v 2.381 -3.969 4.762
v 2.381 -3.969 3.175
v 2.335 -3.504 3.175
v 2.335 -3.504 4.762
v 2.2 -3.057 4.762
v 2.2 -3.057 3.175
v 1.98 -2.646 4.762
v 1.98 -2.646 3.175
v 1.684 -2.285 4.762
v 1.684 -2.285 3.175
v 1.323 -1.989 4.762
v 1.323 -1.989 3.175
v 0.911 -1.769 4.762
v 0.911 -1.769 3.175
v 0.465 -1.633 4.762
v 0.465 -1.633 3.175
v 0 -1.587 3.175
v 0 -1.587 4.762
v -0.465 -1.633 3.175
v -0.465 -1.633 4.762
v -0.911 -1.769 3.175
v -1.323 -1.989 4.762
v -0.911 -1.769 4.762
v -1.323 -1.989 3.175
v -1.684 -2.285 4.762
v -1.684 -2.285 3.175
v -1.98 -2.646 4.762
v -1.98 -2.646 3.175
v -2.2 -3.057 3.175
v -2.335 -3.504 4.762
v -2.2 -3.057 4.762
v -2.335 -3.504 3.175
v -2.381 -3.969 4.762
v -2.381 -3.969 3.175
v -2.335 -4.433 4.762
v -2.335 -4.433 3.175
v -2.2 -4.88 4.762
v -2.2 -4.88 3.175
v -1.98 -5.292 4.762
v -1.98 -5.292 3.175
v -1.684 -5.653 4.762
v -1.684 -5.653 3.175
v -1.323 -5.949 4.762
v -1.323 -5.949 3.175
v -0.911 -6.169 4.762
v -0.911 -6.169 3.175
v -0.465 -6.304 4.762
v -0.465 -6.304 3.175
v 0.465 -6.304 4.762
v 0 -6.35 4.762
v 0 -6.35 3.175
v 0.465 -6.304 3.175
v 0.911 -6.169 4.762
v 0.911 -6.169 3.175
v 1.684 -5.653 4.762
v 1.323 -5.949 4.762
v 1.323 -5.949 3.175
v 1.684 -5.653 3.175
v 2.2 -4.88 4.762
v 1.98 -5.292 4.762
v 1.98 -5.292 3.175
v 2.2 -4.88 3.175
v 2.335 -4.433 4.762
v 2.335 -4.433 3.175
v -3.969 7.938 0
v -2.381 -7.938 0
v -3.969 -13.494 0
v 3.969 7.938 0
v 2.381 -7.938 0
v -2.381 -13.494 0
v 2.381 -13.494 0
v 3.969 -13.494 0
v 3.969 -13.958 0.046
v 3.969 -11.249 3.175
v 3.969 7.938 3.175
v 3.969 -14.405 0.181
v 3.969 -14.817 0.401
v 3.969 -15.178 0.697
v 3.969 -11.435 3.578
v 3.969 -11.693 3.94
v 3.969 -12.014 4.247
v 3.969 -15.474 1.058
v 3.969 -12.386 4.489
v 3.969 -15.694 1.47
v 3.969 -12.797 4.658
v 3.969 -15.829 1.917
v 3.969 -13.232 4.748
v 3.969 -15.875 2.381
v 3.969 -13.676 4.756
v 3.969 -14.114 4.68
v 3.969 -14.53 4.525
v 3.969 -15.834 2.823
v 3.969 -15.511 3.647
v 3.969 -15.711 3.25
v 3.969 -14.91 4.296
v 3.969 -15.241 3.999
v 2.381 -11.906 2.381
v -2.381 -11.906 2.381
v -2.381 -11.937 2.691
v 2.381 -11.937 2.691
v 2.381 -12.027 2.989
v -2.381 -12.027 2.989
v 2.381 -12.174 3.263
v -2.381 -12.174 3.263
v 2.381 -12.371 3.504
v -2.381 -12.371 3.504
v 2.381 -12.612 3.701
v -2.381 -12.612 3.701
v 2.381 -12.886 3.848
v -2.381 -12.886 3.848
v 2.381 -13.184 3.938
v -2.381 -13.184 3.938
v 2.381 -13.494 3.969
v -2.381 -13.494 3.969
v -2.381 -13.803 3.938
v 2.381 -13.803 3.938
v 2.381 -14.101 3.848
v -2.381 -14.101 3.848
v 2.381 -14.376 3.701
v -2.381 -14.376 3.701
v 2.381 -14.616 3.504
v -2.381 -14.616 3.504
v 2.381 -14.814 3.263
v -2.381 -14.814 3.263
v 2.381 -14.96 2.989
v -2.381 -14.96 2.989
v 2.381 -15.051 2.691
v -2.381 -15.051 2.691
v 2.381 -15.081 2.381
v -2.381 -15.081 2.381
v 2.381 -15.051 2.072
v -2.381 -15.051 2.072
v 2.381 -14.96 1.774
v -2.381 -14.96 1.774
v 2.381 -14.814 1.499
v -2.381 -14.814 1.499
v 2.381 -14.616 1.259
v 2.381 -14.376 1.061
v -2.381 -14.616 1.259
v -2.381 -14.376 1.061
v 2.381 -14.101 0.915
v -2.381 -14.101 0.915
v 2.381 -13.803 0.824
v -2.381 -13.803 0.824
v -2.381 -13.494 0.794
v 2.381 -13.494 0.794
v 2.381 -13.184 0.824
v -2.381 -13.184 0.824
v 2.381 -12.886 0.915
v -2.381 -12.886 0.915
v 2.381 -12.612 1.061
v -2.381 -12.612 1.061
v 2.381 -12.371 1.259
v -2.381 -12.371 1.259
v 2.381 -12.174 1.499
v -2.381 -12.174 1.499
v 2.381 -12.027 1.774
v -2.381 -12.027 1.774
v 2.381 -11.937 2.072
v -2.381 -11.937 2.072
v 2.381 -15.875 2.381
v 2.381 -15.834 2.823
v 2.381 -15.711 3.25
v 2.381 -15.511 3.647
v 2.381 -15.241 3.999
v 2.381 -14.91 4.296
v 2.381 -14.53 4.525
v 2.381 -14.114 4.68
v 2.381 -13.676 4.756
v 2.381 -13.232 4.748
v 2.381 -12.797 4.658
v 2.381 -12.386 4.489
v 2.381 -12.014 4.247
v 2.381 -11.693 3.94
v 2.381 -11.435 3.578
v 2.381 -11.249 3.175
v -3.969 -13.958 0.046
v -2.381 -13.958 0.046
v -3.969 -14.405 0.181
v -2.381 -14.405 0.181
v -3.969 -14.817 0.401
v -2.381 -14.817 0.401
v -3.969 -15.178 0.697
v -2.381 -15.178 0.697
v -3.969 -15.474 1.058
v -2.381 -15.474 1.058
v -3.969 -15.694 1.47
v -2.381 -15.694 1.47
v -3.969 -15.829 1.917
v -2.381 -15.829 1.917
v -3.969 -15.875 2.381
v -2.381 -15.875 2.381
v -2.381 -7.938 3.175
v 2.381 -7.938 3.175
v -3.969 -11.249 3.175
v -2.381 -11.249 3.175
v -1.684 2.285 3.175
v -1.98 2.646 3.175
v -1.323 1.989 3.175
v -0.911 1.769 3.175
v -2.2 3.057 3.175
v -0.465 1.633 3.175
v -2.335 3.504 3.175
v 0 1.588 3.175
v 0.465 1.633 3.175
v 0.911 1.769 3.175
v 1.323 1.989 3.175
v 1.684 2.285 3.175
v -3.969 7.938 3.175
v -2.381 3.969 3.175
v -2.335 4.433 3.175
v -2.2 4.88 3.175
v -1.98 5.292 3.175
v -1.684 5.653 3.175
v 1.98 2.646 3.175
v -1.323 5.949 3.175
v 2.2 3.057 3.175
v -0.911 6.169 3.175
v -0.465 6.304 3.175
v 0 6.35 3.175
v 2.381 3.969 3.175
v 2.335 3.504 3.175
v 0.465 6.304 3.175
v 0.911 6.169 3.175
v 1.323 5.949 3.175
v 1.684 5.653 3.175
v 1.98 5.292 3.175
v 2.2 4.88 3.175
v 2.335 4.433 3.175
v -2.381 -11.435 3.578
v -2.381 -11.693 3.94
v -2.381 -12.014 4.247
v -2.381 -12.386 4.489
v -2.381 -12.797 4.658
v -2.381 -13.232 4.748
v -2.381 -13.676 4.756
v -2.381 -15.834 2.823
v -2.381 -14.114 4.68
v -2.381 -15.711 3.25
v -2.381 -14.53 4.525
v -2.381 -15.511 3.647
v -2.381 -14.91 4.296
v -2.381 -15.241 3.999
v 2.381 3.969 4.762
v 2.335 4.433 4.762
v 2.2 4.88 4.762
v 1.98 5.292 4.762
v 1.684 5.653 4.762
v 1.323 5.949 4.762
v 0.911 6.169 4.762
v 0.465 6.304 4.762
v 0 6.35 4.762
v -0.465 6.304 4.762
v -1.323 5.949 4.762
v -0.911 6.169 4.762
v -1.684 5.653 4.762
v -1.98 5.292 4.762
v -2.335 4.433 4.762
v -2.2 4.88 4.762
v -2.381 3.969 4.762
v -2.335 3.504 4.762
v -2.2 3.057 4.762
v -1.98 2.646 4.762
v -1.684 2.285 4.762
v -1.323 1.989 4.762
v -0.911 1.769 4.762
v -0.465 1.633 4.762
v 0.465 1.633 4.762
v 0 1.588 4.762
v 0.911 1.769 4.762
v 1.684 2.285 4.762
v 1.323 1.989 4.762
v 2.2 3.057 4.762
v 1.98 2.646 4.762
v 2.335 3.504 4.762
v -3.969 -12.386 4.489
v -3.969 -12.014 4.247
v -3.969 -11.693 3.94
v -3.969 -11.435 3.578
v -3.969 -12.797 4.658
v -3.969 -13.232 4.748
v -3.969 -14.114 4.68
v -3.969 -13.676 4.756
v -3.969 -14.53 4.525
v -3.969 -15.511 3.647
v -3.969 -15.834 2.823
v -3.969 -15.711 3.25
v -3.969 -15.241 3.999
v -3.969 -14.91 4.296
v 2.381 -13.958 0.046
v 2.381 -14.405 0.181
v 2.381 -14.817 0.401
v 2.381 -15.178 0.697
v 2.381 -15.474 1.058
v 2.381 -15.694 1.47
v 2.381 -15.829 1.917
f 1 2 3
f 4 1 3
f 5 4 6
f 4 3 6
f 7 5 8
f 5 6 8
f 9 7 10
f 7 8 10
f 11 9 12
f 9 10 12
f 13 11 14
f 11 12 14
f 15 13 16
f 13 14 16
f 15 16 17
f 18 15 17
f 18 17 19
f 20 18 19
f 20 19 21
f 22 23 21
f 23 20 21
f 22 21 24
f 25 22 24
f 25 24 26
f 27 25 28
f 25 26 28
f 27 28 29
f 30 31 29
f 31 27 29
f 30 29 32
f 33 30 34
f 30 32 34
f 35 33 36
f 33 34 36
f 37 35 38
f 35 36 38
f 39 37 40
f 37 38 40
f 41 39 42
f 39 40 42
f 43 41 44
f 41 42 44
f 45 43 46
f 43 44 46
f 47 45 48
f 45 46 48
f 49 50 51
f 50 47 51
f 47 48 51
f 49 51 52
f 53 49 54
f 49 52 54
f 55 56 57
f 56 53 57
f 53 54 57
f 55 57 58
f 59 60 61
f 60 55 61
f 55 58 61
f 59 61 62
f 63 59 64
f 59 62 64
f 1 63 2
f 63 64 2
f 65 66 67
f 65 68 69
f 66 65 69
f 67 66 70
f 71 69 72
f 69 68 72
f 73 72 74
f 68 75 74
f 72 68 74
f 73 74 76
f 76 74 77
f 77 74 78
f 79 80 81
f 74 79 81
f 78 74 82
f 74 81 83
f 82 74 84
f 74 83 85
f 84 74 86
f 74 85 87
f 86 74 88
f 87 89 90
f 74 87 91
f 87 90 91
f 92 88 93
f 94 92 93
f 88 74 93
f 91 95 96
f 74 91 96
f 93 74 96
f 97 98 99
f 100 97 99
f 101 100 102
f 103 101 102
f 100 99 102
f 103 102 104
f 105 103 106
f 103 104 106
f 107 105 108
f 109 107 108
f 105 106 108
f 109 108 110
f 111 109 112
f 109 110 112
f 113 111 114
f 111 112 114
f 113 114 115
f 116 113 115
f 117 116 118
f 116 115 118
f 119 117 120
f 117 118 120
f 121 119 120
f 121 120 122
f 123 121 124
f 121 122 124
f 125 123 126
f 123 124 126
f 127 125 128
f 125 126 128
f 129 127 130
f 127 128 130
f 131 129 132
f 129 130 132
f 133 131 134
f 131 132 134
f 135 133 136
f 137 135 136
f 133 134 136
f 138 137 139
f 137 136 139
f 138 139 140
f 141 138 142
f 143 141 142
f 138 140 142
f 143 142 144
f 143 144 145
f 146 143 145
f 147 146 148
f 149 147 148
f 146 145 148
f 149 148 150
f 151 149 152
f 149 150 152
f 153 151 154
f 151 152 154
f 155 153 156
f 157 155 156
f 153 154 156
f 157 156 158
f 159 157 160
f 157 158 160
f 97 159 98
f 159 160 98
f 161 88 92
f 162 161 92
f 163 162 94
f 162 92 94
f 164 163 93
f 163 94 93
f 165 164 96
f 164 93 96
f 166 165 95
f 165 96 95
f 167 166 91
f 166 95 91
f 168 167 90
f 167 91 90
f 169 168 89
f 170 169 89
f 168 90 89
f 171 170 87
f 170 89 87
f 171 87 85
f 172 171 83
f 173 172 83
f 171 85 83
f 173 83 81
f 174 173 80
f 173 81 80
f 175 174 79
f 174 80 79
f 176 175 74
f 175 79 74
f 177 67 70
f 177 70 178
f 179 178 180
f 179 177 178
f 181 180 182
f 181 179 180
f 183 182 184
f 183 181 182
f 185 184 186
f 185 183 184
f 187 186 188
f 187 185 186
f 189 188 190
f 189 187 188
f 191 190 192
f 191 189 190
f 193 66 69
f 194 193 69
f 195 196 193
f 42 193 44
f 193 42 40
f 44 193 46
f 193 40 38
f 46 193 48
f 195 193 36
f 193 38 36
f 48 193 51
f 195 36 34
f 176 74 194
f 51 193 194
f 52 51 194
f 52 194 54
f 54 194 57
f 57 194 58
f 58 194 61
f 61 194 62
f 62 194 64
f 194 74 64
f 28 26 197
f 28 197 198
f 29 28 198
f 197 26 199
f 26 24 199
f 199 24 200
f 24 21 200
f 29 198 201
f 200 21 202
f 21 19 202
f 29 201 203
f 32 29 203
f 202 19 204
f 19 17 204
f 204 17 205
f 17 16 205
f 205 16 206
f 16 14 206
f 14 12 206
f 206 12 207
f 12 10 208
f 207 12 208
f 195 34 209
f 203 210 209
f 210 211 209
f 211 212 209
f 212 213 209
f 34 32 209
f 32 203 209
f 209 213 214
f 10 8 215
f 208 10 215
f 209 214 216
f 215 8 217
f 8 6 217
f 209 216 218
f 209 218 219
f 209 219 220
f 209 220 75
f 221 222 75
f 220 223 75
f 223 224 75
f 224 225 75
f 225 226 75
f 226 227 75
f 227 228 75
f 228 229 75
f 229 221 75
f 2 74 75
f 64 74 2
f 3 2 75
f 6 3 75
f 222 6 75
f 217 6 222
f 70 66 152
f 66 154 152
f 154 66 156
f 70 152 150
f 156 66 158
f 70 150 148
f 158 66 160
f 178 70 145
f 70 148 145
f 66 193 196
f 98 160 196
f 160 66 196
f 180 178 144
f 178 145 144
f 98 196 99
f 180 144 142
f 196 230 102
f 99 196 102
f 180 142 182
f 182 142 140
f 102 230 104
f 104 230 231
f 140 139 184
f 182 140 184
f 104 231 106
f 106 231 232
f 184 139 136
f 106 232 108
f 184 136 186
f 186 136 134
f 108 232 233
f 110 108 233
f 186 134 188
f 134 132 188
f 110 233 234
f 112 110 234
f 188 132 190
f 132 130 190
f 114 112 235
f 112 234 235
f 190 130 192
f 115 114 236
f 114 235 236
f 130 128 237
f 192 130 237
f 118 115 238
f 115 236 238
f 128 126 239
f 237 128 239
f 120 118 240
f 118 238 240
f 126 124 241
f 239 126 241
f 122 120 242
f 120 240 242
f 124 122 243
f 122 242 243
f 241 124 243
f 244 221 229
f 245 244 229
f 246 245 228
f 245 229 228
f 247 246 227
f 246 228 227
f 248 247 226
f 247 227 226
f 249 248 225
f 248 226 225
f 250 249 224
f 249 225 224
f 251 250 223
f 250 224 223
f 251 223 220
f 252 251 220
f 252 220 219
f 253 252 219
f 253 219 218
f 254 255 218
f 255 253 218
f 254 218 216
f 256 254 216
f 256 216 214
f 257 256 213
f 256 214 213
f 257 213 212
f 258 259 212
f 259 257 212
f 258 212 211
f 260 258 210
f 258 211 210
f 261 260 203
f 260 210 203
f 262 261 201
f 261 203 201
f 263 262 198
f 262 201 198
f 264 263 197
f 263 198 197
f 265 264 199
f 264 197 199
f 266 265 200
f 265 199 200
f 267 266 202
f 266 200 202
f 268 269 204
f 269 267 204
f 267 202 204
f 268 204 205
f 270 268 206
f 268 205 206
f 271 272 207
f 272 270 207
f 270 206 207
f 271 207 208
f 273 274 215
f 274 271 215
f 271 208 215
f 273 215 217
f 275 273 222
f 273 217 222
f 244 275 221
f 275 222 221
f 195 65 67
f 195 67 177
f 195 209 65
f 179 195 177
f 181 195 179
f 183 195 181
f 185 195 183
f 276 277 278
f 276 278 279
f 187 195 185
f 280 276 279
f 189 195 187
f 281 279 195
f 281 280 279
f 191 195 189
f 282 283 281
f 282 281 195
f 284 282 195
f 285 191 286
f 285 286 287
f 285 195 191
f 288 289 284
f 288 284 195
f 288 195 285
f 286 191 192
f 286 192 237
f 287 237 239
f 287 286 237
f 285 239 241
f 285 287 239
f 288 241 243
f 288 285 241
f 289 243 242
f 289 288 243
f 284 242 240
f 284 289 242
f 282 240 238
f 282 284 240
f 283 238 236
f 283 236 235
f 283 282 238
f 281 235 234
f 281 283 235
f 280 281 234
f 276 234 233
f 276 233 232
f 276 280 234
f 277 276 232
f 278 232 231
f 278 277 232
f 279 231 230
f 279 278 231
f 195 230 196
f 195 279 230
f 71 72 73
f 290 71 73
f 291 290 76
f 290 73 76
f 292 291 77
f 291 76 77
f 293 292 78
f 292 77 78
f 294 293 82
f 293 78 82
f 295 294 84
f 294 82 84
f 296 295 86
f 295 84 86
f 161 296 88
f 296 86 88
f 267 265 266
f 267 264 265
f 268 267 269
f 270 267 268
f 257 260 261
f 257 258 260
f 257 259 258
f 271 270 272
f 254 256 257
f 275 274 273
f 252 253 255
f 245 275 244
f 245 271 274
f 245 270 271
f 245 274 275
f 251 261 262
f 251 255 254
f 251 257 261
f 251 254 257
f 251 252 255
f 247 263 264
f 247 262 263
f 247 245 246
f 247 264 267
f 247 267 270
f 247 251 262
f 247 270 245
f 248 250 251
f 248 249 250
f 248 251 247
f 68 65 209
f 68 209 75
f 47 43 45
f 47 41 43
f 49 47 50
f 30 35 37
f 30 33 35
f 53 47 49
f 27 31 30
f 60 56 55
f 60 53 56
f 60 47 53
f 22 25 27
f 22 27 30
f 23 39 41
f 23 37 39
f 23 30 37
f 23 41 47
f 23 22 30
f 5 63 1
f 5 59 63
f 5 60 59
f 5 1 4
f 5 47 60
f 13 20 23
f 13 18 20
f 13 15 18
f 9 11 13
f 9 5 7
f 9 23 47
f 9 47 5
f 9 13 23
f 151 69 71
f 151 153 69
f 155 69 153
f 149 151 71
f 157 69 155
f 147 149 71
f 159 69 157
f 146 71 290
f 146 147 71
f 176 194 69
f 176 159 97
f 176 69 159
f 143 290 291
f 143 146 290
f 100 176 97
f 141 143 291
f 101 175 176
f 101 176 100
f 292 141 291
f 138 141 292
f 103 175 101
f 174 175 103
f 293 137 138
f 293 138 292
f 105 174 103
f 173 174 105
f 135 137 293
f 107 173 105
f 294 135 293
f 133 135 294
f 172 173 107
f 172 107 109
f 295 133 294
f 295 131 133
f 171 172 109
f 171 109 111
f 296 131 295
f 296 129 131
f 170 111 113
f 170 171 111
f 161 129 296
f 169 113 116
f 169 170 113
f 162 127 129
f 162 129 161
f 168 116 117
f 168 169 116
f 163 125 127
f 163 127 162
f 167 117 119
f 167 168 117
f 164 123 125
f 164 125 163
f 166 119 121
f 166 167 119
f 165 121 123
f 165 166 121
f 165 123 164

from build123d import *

# Parameters (mm, degrees)
F0_W     = 7.9375
F0_H     = 15.875
F0_R     = 2.38125
F1_DEPTH = 3.175
F2_DEPTH = 4.7625
F4_DEPTH = 1.5875
F6_R     = 1.5875
F7_DEPTH = 4.7625


with BuildPart() as f1:
    # F0 (on Top) → F1 (new body)
    with BuildSketch(Plane.XY):
        Rectangle(F0_W, F0_H)
        with Locations((0, -3.96875)):
            Circle(F0_R, mode=Mode.SUBTRACT)
        with Locations((0, 3.96875)):
            Circle(F0_R, mode=Mode.SUBTRACT)
    extrude(amount=F1_DEPTH)

    # F0 (on Top) → F2 (join)
    with BuildSketch(Plane.XY):
        with Locations((0, 3.96875)):
            Circle(F0_R)
        with Locations((0, -3.96875)):
            Circle(F0_R)
    extrude(amount=F2_DEPTH)

    # F3 (on face) → F4 (join)
    with BuildSketch(Plane(origin=(-3.96875, 0, 0), x_dir=(0, -1, 0), z_dir=(-1, 0, 0))):
        Polygon((7.9375, 3.175), (7.9375, 0), (11.1125, 0), (11.1125, 2.38125), (11.1125, 3.175), align=None)
        with BuildLine():
            Line((11.1125, 2.38125), (11.1125, 0))
            Line((11.1125, 0), (13.49375, 0))
            ThreePointArc((13.49375, 0), (11.809952, 0.697452), (11.1125, 2.38125))
        make_face()
        with BuildLine():
            Line((11.1125, 3.175), (11.1125, 2.38125))
            ThreePointArc((11.1125, 2.38125), (11.146793, 2.783924), (11.248686, 3.175))
            Line((11.248686, 3.175), (11.1125, 3.175))
        make_face()
        with BuildLine():
            ThreePointArc((11.248686, 3.175), (11.146793, 2.783924), (11.1125, 2.38125))
            ThreePointArc((11.1125, 2.38125), (11.809952, 0.697452), (13.49375, 0))
            ThreePointArc((13.49375, 0), (15.177548, 0.697452), (15.875, 2.38125))
            ThreePointArc((15.875, 2.38125), (13.896424, 4.728207), (11.248686, 3.175))
        make_face()
    extrude(amount=-F4_DEPTH)

    # F5: F1 across plane


with BuildPart() as f1_1:
    add(f1.part)
    add(f1.part.mirror(Plane.YZ))

    # F6 (on face) → F7 (join)
    with BuildSketch(Plane.YZ.offset(-2.38125)):
        with Locations((-13.49375, 2.38125)):
            Circle(F6_R)
    extrude(amount=F7_DEPTH)


solid = f1_1.part
